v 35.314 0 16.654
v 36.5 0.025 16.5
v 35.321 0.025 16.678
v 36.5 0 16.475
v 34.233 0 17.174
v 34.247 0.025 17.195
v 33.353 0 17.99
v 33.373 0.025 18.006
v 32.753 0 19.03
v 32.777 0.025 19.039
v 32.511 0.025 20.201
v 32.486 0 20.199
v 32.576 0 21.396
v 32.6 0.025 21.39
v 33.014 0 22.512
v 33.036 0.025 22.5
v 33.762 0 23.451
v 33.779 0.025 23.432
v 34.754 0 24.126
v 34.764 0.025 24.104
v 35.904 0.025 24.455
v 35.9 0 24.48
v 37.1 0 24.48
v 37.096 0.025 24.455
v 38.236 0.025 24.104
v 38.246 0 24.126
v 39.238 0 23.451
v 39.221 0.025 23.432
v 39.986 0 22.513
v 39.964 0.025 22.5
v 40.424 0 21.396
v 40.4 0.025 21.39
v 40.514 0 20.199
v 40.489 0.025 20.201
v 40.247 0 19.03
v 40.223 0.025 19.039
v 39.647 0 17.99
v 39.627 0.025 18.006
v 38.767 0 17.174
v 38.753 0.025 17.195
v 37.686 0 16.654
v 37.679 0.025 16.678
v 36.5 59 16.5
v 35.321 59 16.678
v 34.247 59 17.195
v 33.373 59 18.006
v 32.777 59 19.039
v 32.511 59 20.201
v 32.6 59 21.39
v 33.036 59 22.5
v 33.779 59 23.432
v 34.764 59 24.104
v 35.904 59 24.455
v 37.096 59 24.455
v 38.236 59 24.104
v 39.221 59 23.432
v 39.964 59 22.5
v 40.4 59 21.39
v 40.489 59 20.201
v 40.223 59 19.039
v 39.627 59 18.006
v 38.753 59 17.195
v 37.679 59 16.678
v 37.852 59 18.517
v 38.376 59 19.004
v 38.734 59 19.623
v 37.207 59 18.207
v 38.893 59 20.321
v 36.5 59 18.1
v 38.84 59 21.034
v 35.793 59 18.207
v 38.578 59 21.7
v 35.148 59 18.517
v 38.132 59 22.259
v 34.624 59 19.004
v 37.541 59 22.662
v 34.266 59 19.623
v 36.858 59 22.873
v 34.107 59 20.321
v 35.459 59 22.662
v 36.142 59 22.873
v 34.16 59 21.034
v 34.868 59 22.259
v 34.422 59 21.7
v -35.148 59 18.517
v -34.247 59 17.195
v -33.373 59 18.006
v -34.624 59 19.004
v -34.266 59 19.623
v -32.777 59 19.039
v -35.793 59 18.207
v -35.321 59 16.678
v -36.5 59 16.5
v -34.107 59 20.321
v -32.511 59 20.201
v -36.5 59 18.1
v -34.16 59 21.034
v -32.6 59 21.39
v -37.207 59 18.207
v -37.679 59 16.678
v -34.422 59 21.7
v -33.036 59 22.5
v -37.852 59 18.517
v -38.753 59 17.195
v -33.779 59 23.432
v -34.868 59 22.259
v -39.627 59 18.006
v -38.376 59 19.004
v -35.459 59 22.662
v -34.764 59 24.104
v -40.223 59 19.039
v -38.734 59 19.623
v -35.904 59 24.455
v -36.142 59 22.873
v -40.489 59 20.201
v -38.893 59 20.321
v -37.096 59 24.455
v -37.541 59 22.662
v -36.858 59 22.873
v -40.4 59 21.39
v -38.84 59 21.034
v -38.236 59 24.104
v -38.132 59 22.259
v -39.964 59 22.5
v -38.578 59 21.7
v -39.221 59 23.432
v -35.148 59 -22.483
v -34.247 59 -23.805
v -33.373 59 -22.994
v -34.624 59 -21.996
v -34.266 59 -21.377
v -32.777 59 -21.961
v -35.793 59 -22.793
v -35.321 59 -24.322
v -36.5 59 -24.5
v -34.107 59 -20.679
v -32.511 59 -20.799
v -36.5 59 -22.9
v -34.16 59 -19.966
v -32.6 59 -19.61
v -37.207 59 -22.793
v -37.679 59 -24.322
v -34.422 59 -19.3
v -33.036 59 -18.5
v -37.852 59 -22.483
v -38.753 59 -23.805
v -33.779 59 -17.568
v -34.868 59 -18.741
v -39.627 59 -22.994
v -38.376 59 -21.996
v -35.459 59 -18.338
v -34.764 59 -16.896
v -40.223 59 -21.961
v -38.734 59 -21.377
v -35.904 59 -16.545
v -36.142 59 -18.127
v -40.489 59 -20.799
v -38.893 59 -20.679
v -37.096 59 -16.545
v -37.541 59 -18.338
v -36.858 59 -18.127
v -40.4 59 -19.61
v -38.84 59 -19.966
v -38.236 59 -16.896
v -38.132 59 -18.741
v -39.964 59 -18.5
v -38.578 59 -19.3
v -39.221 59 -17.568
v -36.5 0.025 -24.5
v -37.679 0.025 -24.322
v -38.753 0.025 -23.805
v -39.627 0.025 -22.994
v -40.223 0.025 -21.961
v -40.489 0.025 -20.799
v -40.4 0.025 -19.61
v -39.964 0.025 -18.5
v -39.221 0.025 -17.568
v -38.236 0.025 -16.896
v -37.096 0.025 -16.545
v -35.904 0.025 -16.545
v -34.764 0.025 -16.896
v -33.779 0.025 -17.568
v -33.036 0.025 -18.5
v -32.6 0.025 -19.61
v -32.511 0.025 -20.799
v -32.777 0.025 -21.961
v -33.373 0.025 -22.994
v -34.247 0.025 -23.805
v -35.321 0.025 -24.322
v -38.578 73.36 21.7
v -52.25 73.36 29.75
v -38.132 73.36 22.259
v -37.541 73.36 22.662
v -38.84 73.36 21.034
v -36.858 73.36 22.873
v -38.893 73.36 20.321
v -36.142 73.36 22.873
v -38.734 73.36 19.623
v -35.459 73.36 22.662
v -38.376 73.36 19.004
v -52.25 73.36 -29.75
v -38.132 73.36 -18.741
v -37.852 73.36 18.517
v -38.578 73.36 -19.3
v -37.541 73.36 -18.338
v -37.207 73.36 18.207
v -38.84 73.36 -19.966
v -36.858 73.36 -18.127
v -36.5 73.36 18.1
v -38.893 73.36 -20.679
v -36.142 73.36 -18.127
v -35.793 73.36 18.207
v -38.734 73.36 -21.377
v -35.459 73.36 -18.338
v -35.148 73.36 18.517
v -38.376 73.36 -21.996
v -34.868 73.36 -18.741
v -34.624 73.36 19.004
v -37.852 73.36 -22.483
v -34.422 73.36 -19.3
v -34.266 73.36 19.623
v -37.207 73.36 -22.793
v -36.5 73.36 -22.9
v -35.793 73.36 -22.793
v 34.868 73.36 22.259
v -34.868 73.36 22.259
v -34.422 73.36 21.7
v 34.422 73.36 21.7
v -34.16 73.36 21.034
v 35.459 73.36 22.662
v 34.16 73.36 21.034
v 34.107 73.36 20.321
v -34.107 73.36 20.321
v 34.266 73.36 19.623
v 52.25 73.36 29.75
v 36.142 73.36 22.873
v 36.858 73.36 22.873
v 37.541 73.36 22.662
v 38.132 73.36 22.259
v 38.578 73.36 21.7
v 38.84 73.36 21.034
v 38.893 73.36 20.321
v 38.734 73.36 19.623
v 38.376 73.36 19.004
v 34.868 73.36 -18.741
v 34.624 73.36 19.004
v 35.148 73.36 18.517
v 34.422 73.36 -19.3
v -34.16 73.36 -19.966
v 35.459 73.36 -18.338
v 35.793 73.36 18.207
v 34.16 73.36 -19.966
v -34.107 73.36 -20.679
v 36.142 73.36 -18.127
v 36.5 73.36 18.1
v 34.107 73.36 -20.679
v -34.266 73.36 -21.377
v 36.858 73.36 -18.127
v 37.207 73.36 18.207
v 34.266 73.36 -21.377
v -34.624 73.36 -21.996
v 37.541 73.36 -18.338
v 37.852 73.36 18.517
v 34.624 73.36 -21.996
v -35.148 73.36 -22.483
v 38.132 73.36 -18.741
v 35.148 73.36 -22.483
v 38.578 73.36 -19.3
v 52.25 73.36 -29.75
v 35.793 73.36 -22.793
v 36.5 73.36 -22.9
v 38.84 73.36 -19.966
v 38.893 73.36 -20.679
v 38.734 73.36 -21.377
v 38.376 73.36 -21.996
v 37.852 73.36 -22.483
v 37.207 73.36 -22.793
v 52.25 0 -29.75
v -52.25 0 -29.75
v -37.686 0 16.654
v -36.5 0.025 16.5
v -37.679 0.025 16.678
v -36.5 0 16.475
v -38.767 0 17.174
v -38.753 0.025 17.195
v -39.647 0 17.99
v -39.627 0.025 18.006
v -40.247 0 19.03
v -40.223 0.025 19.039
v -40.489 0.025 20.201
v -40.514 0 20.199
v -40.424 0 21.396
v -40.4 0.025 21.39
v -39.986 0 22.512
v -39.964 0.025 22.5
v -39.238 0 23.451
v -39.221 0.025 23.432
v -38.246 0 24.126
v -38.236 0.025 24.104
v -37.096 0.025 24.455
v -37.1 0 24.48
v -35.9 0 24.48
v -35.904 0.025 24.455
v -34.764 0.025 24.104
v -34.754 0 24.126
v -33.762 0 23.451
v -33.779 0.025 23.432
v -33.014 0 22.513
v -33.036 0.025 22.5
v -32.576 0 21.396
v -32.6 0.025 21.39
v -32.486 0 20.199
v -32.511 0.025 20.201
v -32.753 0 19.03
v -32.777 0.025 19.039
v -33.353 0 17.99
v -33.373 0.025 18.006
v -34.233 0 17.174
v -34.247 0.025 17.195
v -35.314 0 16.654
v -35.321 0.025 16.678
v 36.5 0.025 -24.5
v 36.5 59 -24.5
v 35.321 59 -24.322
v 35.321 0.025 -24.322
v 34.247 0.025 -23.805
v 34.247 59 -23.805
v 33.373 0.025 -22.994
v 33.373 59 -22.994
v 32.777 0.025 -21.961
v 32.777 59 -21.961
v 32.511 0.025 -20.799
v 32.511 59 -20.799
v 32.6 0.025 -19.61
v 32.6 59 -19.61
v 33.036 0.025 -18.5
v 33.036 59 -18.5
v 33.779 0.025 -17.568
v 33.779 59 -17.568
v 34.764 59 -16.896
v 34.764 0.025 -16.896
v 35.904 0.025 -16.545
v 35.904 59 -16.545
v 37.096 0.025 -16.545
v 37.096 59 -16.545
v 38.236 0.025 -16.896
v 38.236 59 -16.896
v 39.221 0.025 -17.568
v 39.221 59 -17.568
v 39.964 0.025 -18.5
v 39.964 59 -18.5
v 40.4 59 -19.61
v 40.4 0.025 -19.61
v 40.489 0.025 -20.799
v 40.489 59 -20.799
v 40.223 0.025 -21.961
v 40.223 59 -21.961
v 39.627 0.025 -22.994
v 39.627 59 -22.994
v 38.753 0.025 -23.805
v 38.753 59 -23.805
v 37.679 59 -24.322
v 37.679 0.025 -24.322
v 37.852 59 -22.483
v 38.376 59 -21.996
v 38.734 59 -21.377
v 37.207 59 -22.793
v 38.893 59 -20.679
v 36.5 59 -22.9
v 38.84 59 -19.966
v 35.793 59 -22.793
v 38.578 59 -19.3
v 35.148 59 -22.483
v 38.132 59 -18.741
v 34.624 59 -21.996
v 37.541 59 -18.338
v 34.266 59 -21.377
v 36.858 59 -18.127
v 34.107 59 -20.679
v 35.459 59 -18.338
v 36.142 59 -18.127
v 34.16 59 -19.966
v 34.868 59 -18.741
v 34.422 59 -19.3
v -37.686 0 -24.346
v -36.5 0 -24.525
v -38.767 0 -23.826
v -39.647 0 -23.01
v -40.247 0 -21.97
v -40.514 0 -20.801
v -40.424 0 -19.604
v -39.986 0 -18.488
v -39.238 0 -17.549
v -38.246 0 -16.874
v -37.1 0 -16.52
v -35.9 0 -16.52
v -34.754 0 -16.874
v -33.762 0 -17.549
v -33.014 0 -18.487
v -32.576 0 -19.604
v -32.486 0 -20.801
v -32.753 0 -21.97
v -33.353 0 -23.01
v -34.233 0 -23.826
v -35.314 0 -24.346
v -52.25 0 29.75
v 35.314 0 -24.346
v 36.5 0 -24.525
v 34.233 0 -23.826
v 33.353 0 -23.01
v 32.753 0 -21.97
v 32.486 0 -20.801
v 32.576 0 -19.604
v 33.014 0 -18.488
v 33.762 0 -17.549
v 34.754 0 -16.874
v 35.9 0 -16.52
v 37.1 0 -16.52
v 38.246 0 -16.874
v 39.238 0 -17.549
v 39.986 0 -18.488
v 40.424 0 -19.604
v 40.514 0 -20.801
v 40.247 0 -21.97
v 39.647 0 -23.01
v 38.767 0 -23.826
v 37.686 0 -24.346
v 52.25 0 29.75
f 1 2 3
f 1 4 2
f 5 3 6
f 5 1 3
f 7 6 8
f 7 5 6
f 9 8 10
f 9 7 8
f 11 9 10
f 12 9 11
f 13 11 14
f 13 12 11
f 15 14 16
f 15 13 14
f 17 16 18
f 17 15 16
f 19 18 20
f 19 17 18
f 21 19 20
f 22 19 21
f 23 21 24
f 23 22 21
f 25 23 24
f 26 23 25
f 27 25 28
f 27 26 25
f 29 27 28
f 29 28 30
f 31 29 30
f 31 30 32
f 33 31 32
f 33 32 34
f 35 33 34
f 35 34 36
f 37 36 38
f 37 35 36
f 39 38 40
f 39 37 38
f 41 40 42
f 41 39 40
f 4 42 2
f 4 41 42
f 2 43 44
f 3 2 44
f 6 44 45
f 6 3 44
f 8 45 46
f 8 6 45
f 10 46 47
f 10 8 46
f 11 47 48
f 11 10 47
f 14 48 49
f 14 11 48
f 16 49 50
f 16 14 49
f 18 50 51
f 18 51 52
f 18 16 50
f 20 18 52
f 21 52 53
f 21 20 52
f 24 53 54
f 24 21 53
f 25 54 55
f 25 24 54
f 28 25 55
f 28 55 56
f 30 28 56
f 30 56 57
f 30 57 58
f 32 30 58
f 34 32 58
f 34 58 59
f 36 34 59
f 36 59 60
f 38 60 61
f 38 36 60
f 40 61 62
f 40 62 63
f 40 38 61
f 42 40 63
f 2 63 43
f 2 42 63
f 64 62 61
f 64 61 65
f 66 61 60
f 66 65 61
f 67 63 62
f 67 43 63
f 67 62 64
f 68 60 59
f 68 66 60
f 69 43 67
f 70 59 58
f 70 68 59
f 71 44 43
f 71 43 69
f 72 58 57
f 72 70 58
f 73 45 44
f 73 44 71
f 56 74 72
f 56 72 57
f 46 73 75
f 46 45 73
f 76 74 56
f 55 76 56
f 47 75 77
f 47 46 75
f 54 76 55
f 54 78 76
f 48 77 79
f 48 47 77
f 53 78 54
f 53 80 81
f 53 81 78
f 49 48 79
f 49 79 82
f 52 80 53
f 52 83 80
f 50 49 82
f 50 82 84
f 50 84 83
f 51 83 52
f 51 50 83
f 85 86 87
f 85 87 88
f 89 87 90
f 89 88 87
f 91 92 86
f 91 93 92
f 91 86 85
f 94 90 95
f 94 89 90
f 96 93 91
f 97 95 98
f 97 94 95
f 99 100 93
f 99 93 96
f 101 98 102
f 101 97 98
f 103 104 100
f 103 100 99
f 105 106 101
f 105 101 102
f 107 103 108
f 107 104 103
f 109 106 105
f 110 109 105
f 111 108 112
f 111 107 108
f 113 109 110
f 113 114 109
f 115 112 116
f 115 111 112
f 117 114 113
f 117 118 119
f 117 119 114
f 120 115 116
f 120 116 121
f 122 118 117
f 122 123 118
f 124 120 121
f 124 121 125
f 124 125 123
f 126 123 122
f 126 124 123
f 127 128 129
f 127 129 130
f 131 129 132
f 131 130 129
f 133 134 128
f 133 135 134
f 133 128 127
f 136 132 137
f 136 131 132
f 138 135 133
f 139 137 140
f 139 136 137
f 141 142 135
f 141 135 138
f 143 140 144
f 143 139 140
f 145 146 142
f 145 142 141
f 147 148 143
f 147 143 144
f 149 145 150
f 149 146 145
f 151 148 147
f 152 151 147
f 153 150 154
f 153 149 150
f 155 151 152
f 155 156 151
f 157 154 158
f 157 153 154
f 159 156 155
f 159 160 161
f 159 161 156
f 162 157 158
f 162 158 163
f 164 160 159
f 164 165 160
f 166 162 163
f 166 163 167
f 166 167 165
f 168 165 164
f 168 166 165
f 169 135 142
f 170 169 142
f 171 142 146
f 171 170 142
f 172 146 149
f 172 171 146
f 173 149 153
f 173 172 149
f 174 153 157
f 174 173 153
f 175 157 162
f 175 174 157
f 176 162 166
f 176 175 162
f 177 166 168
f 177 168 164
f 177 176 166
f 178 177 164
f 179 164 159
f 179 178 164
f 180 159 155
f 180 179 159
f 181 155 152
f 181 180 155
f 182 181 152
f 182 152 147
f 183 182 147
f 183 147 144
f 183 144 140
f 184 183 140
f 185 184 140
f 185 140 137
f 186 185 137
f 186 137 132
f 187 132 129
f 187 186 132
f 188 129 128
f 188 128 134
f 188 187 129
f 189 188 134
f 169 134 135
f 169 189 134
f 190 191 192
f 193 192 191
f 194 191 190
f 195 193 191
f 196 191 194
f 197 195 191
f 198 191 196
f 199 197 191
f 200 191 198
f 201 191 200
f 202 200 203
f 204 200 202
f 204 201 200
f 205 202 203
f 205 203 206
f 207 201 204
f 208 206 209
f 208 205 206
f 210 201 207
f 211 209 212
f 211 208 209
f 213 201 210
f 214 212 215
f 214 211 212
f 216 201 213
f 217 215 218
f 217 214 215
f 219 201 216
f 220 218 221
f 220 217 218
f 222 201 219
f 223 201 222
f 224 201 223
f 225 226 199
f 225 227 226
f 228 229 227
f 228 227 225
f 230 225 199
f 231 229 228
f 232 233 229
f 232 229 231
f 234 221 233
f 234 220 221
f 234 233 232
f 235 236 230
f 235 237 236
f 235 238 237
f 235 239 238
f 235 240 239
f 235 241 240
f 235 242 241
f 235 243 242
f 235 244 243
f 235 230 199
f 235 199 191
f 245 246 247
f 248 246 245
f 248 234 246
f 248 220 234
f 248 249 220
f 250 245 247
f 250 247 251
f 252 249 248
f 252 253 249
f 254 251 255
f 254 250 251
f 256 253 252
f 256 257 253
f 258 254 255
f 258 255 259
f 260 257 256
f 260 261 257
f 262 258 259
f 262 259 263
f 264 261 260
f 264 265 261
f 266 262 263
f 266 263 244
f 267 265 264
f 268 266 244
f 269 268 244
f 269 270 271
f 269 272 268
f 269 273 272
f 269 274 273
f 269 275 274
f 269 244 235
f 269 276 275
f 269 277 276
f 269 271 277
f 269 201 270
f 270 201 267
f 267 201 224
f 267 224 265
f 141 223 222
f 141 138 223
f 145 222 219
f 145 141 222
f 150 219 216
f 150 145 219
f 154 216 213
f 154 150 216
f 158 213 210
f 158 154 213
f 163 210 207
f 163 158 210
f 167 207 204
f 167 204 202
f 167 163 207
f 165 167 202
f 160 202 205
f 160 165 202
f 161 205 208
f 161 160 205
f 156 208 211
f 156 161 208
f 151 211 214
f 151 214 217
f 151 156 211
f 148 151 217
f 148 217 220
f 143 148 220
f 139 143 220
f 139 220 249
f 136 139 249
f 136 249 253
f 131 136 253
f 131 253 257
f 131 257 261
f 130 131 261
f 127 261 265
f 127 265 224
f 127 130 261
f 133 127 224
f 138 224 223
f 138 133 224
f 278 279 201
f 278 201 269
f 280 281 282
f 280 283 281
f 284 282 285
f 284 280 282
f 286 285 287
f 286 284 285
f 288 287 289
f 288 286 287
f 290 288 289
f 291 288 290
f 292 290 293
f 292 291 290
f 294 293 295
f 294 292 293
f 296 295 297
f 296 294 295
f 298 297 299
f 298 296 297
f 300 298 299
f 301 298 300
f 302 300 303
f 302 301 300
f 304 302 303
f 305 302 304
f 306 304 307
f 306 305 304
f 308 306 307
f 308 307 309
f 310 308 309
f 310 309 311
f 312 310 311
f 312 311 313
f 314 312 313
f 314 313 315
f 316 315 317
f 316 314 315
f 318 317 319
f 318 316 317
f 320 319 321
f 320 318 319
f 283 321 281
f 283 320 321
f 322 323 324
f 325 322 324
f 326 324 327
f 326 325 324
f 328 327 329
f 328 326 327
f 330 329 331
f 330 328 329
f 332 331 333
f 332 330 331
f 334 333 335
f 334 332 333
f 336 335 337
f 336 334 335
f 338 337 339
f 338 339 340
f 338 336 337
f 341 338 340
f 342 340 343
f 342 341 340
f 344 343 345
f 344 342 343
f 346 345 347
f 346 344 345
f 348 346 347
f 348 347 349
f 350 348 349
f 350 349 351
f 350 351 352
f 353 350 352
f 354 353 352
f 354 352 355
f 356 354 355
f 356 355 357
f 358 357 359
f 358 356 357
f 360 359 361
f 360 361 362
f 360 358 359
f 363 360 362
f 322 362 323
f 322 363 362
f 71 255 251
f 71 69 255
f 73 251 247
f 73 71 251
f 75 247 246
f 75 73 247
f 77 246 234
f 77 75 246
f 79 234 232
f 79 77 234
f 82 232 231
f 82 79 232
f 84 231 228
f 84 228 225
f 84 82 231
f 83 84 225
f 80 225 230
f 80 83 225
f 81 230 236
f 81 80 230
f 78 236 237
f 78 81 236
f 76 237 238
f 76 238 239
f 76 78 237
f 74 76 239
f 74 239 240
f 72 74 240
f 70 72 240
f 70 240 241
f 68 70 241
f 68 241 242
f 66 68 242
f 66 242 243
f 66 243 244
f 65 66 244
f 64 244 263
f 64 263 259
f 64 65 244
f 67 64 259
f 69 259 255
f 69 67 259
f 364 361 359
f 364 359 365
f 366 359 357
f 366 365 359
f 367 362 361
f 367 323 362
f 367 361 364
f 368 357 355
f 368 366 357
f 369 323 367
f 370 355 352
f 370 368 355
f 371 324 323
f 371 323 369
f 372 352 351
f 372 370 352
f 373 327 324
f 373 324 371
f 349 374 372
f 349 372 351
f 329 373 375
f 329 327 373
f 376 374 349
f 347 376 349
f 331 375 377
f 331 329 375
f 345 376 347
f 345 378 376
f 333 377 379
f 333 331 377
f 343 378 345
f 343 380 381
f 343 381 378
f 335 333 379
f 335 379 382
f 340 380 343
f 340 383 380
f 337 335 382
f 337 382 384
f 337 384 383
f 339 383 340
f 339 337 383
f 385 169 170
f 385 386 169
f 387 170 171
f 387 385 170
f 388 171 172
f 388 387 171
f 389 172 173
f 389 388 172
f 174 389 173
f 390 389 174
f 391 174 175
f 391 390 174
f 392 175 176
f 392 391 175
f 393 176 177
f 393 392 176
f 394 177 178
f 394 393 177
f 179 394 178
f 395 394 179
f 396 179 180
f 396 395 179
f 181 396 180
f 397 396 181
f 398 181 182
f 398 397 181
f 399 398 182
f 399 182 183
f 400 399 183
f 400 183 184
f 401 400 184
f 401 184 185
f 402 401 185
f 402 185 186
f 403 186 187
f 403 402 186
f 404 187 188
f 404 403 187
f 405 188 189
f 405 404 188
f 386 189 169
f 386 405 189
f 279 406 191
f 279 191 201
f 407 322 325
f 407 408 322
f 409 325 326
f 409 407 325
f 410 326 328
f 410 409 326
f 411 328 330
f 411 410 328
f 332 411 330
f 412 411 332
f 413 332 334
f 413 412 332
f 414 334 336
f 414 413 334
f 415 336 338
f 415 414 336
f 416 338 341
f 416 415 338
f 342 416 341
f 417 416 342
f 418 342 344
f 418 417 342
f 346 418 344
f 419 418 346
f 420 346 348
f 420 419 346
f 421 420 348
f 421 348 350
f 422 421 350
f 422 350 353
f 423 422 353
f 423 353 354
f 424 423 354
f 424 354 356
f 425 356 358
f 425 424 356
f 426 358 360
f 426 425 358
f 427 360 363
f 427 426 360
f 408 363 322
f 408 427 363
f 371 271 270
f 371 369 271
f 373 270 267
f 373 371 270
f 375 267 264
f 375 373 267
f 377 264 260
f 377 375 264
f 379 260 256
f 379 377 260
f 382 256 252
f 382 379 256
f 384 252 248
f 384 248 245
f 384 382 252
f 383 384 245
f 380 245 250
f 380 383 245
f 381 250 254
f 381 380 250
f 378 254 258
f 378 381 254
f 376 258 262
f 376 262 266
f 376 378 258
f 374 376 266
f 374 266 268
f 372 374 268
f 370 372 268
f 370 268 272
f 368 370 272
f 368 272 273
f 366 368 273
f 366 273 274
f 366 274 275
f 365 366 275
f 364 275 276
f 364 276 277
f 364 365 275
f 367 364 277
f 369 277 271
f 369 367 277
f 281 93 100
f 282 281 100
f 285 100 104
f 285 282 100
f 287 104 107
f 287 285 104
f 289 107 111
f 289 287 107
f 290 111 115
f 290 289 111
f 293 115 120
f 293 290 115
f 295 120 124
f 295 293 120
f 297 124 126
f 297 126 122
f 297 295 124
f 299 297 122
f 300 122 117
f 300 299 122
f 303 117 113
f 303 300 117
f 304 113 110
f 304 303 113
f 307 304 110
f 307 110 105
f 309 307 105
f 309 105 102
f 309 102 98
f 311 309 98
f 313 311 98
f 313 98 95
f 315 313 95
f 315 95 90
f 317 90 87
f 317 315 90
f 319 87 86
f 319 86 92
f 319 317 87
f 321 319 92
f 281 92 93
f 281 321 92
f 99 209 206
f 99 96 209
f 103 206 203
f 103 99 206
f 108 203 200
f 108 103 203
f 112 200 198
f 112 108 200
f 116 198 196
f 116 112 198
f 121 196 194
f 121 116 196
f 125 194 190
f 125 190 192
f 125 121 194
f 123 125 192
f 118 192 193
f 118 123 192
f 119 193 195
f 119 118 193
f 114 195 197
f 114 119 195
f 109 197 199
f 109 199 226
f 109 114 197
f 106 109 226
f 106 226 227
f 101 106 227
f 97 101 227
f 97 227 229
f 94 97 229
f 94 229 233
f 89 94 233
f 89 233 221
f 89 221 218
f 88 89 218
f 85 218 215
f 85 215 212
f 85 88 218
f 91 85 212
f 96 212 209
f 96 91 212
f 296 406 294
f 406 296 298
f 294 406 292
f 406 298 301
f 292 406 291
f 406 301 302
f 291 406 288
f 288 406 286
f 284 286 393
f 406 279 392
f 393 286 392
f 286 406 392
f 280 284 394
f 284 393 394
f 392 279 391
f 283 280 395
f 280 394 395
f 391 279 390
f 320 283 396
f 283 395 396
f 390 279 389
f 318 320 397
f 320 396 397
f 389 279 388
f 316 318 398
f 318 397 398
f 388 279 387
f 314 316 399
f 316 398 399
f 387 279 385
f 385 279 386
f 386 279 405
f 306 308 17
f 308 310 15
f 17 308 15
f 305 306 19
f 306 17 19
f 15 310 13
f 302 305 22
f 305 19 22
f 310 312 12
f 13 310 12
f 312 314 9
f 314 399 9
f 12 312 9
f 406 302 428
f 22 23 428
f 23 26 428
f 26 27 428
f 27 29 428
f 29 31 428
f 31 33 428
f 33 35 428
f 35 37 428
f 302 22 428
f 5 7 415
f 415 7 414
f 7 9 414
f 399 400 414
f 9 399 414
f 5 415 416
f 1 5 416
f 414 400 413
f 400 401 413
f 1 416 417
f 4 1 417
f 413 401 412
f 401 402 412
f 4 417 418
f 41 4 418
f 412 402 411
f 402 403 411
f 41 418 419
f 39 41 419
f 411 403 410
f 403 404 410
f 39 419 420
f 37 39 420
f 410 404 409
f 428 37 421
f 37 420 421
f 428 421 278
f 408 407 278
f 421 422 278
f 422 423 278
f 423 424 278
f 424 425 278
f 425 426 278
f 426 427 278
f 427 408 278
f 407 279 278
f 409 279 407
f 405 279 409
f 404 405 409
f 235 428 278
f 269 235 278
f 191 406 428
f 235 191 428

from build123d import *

# Parameters (mm, degrees)
SKETCH1_W                     = 104.5
SKETCH1_H                     = 59.5
BOSS_EXTRUDE1_DEPTH           = 73.36
CBORE_FOR_M4_SHCS2_AT_2_COUNT = 2
CBORE_FOR_M4_SHCS2_AT_2_PITCH = 73
CBORE_FOR_M4_SHCS2_AT_3_COUNT = 2
CBORE_FOR_M4_SHCS2_AT_3_PITCH = 83.725742756
CBORE_FOR_M4_SHCS2_AT_4_COUNT = 2
CBORE_FOR_M4_SHCS2_AT_4_PITCH = 41


with BuildPart() as part:
    # Sketch1 → Boss-Extrude1 (new body)
    with BuildSketch(Plane(origin=(0, 0, 0), x_dir=(1, 0, 0), z_dir=(0, 1, 0))):
        Rectangle(SKETCH1_W, SKETCH1_H)
    extrude(amount=BOSS_EXTRUDE1_DEPTH)

    # Sketch3 → CBORE for M4 SHCS2 (revolve, cut)
    with BuildSketch(Plane(origin=(-36.5, 0, 20.5), x_dir=(0, 0, -1), z_dir=(1, 0, 0))):
        Polygon((0, 0), (0, 73.36), (2.4, 73.36), (2.4, 59), (4, 59), (4, 0.025), (4.025, 0), align=None)
    cbore_for_m4_shcs2 = revolve(axis=Axis((-36.5, -6.35, 20.5), (0, 1, 0)), mode=Mode.SUBTRACT)

    # CBORE for M4 SHCS2 at 2: CBORE for M4 SHCS2 ×2
    with Locations(*[(i * CBORE_FOR_M4_SHCS2_AT_2_PITCH, 0, 0) for i in range(1, CBORE_FOR_M4_SHCS2_AT_2_COUNT)]):
        add(cbore_for_m4_shcs2, mode=Mode.SUBTRACT)

    # CBORE for M4 SHCS2 at 3: CBORE for M4 SHCS2 ×2
    with Locations(*[Vector(0.8718943254163863, 0, -0.48969407317906627) * (i * CBORE_FOR_M4_SHCS2_AT_3_PITCH) for i in range(1, CBORE_FOR_M4_SHCS2_AT_3_COUNT)]):
        add(cbore_for_m4_shcs2, mode=Mode.SUBTRACT)

    # CBORE for M4 SHCS2 at 4: CBORE for M4 SHCS2 ×2
    with Locations(*[(0, 0, -i * CBORE_FOR_M4_SHCS2_AT_4_PITCH) for i in range(1, CBORE_FOR_M4_SHCS2_AT_4_COUNT)]):
        add(cbore_for_m4_shcs2, mode=Mode.SUBTRACT)


solid = part.part
